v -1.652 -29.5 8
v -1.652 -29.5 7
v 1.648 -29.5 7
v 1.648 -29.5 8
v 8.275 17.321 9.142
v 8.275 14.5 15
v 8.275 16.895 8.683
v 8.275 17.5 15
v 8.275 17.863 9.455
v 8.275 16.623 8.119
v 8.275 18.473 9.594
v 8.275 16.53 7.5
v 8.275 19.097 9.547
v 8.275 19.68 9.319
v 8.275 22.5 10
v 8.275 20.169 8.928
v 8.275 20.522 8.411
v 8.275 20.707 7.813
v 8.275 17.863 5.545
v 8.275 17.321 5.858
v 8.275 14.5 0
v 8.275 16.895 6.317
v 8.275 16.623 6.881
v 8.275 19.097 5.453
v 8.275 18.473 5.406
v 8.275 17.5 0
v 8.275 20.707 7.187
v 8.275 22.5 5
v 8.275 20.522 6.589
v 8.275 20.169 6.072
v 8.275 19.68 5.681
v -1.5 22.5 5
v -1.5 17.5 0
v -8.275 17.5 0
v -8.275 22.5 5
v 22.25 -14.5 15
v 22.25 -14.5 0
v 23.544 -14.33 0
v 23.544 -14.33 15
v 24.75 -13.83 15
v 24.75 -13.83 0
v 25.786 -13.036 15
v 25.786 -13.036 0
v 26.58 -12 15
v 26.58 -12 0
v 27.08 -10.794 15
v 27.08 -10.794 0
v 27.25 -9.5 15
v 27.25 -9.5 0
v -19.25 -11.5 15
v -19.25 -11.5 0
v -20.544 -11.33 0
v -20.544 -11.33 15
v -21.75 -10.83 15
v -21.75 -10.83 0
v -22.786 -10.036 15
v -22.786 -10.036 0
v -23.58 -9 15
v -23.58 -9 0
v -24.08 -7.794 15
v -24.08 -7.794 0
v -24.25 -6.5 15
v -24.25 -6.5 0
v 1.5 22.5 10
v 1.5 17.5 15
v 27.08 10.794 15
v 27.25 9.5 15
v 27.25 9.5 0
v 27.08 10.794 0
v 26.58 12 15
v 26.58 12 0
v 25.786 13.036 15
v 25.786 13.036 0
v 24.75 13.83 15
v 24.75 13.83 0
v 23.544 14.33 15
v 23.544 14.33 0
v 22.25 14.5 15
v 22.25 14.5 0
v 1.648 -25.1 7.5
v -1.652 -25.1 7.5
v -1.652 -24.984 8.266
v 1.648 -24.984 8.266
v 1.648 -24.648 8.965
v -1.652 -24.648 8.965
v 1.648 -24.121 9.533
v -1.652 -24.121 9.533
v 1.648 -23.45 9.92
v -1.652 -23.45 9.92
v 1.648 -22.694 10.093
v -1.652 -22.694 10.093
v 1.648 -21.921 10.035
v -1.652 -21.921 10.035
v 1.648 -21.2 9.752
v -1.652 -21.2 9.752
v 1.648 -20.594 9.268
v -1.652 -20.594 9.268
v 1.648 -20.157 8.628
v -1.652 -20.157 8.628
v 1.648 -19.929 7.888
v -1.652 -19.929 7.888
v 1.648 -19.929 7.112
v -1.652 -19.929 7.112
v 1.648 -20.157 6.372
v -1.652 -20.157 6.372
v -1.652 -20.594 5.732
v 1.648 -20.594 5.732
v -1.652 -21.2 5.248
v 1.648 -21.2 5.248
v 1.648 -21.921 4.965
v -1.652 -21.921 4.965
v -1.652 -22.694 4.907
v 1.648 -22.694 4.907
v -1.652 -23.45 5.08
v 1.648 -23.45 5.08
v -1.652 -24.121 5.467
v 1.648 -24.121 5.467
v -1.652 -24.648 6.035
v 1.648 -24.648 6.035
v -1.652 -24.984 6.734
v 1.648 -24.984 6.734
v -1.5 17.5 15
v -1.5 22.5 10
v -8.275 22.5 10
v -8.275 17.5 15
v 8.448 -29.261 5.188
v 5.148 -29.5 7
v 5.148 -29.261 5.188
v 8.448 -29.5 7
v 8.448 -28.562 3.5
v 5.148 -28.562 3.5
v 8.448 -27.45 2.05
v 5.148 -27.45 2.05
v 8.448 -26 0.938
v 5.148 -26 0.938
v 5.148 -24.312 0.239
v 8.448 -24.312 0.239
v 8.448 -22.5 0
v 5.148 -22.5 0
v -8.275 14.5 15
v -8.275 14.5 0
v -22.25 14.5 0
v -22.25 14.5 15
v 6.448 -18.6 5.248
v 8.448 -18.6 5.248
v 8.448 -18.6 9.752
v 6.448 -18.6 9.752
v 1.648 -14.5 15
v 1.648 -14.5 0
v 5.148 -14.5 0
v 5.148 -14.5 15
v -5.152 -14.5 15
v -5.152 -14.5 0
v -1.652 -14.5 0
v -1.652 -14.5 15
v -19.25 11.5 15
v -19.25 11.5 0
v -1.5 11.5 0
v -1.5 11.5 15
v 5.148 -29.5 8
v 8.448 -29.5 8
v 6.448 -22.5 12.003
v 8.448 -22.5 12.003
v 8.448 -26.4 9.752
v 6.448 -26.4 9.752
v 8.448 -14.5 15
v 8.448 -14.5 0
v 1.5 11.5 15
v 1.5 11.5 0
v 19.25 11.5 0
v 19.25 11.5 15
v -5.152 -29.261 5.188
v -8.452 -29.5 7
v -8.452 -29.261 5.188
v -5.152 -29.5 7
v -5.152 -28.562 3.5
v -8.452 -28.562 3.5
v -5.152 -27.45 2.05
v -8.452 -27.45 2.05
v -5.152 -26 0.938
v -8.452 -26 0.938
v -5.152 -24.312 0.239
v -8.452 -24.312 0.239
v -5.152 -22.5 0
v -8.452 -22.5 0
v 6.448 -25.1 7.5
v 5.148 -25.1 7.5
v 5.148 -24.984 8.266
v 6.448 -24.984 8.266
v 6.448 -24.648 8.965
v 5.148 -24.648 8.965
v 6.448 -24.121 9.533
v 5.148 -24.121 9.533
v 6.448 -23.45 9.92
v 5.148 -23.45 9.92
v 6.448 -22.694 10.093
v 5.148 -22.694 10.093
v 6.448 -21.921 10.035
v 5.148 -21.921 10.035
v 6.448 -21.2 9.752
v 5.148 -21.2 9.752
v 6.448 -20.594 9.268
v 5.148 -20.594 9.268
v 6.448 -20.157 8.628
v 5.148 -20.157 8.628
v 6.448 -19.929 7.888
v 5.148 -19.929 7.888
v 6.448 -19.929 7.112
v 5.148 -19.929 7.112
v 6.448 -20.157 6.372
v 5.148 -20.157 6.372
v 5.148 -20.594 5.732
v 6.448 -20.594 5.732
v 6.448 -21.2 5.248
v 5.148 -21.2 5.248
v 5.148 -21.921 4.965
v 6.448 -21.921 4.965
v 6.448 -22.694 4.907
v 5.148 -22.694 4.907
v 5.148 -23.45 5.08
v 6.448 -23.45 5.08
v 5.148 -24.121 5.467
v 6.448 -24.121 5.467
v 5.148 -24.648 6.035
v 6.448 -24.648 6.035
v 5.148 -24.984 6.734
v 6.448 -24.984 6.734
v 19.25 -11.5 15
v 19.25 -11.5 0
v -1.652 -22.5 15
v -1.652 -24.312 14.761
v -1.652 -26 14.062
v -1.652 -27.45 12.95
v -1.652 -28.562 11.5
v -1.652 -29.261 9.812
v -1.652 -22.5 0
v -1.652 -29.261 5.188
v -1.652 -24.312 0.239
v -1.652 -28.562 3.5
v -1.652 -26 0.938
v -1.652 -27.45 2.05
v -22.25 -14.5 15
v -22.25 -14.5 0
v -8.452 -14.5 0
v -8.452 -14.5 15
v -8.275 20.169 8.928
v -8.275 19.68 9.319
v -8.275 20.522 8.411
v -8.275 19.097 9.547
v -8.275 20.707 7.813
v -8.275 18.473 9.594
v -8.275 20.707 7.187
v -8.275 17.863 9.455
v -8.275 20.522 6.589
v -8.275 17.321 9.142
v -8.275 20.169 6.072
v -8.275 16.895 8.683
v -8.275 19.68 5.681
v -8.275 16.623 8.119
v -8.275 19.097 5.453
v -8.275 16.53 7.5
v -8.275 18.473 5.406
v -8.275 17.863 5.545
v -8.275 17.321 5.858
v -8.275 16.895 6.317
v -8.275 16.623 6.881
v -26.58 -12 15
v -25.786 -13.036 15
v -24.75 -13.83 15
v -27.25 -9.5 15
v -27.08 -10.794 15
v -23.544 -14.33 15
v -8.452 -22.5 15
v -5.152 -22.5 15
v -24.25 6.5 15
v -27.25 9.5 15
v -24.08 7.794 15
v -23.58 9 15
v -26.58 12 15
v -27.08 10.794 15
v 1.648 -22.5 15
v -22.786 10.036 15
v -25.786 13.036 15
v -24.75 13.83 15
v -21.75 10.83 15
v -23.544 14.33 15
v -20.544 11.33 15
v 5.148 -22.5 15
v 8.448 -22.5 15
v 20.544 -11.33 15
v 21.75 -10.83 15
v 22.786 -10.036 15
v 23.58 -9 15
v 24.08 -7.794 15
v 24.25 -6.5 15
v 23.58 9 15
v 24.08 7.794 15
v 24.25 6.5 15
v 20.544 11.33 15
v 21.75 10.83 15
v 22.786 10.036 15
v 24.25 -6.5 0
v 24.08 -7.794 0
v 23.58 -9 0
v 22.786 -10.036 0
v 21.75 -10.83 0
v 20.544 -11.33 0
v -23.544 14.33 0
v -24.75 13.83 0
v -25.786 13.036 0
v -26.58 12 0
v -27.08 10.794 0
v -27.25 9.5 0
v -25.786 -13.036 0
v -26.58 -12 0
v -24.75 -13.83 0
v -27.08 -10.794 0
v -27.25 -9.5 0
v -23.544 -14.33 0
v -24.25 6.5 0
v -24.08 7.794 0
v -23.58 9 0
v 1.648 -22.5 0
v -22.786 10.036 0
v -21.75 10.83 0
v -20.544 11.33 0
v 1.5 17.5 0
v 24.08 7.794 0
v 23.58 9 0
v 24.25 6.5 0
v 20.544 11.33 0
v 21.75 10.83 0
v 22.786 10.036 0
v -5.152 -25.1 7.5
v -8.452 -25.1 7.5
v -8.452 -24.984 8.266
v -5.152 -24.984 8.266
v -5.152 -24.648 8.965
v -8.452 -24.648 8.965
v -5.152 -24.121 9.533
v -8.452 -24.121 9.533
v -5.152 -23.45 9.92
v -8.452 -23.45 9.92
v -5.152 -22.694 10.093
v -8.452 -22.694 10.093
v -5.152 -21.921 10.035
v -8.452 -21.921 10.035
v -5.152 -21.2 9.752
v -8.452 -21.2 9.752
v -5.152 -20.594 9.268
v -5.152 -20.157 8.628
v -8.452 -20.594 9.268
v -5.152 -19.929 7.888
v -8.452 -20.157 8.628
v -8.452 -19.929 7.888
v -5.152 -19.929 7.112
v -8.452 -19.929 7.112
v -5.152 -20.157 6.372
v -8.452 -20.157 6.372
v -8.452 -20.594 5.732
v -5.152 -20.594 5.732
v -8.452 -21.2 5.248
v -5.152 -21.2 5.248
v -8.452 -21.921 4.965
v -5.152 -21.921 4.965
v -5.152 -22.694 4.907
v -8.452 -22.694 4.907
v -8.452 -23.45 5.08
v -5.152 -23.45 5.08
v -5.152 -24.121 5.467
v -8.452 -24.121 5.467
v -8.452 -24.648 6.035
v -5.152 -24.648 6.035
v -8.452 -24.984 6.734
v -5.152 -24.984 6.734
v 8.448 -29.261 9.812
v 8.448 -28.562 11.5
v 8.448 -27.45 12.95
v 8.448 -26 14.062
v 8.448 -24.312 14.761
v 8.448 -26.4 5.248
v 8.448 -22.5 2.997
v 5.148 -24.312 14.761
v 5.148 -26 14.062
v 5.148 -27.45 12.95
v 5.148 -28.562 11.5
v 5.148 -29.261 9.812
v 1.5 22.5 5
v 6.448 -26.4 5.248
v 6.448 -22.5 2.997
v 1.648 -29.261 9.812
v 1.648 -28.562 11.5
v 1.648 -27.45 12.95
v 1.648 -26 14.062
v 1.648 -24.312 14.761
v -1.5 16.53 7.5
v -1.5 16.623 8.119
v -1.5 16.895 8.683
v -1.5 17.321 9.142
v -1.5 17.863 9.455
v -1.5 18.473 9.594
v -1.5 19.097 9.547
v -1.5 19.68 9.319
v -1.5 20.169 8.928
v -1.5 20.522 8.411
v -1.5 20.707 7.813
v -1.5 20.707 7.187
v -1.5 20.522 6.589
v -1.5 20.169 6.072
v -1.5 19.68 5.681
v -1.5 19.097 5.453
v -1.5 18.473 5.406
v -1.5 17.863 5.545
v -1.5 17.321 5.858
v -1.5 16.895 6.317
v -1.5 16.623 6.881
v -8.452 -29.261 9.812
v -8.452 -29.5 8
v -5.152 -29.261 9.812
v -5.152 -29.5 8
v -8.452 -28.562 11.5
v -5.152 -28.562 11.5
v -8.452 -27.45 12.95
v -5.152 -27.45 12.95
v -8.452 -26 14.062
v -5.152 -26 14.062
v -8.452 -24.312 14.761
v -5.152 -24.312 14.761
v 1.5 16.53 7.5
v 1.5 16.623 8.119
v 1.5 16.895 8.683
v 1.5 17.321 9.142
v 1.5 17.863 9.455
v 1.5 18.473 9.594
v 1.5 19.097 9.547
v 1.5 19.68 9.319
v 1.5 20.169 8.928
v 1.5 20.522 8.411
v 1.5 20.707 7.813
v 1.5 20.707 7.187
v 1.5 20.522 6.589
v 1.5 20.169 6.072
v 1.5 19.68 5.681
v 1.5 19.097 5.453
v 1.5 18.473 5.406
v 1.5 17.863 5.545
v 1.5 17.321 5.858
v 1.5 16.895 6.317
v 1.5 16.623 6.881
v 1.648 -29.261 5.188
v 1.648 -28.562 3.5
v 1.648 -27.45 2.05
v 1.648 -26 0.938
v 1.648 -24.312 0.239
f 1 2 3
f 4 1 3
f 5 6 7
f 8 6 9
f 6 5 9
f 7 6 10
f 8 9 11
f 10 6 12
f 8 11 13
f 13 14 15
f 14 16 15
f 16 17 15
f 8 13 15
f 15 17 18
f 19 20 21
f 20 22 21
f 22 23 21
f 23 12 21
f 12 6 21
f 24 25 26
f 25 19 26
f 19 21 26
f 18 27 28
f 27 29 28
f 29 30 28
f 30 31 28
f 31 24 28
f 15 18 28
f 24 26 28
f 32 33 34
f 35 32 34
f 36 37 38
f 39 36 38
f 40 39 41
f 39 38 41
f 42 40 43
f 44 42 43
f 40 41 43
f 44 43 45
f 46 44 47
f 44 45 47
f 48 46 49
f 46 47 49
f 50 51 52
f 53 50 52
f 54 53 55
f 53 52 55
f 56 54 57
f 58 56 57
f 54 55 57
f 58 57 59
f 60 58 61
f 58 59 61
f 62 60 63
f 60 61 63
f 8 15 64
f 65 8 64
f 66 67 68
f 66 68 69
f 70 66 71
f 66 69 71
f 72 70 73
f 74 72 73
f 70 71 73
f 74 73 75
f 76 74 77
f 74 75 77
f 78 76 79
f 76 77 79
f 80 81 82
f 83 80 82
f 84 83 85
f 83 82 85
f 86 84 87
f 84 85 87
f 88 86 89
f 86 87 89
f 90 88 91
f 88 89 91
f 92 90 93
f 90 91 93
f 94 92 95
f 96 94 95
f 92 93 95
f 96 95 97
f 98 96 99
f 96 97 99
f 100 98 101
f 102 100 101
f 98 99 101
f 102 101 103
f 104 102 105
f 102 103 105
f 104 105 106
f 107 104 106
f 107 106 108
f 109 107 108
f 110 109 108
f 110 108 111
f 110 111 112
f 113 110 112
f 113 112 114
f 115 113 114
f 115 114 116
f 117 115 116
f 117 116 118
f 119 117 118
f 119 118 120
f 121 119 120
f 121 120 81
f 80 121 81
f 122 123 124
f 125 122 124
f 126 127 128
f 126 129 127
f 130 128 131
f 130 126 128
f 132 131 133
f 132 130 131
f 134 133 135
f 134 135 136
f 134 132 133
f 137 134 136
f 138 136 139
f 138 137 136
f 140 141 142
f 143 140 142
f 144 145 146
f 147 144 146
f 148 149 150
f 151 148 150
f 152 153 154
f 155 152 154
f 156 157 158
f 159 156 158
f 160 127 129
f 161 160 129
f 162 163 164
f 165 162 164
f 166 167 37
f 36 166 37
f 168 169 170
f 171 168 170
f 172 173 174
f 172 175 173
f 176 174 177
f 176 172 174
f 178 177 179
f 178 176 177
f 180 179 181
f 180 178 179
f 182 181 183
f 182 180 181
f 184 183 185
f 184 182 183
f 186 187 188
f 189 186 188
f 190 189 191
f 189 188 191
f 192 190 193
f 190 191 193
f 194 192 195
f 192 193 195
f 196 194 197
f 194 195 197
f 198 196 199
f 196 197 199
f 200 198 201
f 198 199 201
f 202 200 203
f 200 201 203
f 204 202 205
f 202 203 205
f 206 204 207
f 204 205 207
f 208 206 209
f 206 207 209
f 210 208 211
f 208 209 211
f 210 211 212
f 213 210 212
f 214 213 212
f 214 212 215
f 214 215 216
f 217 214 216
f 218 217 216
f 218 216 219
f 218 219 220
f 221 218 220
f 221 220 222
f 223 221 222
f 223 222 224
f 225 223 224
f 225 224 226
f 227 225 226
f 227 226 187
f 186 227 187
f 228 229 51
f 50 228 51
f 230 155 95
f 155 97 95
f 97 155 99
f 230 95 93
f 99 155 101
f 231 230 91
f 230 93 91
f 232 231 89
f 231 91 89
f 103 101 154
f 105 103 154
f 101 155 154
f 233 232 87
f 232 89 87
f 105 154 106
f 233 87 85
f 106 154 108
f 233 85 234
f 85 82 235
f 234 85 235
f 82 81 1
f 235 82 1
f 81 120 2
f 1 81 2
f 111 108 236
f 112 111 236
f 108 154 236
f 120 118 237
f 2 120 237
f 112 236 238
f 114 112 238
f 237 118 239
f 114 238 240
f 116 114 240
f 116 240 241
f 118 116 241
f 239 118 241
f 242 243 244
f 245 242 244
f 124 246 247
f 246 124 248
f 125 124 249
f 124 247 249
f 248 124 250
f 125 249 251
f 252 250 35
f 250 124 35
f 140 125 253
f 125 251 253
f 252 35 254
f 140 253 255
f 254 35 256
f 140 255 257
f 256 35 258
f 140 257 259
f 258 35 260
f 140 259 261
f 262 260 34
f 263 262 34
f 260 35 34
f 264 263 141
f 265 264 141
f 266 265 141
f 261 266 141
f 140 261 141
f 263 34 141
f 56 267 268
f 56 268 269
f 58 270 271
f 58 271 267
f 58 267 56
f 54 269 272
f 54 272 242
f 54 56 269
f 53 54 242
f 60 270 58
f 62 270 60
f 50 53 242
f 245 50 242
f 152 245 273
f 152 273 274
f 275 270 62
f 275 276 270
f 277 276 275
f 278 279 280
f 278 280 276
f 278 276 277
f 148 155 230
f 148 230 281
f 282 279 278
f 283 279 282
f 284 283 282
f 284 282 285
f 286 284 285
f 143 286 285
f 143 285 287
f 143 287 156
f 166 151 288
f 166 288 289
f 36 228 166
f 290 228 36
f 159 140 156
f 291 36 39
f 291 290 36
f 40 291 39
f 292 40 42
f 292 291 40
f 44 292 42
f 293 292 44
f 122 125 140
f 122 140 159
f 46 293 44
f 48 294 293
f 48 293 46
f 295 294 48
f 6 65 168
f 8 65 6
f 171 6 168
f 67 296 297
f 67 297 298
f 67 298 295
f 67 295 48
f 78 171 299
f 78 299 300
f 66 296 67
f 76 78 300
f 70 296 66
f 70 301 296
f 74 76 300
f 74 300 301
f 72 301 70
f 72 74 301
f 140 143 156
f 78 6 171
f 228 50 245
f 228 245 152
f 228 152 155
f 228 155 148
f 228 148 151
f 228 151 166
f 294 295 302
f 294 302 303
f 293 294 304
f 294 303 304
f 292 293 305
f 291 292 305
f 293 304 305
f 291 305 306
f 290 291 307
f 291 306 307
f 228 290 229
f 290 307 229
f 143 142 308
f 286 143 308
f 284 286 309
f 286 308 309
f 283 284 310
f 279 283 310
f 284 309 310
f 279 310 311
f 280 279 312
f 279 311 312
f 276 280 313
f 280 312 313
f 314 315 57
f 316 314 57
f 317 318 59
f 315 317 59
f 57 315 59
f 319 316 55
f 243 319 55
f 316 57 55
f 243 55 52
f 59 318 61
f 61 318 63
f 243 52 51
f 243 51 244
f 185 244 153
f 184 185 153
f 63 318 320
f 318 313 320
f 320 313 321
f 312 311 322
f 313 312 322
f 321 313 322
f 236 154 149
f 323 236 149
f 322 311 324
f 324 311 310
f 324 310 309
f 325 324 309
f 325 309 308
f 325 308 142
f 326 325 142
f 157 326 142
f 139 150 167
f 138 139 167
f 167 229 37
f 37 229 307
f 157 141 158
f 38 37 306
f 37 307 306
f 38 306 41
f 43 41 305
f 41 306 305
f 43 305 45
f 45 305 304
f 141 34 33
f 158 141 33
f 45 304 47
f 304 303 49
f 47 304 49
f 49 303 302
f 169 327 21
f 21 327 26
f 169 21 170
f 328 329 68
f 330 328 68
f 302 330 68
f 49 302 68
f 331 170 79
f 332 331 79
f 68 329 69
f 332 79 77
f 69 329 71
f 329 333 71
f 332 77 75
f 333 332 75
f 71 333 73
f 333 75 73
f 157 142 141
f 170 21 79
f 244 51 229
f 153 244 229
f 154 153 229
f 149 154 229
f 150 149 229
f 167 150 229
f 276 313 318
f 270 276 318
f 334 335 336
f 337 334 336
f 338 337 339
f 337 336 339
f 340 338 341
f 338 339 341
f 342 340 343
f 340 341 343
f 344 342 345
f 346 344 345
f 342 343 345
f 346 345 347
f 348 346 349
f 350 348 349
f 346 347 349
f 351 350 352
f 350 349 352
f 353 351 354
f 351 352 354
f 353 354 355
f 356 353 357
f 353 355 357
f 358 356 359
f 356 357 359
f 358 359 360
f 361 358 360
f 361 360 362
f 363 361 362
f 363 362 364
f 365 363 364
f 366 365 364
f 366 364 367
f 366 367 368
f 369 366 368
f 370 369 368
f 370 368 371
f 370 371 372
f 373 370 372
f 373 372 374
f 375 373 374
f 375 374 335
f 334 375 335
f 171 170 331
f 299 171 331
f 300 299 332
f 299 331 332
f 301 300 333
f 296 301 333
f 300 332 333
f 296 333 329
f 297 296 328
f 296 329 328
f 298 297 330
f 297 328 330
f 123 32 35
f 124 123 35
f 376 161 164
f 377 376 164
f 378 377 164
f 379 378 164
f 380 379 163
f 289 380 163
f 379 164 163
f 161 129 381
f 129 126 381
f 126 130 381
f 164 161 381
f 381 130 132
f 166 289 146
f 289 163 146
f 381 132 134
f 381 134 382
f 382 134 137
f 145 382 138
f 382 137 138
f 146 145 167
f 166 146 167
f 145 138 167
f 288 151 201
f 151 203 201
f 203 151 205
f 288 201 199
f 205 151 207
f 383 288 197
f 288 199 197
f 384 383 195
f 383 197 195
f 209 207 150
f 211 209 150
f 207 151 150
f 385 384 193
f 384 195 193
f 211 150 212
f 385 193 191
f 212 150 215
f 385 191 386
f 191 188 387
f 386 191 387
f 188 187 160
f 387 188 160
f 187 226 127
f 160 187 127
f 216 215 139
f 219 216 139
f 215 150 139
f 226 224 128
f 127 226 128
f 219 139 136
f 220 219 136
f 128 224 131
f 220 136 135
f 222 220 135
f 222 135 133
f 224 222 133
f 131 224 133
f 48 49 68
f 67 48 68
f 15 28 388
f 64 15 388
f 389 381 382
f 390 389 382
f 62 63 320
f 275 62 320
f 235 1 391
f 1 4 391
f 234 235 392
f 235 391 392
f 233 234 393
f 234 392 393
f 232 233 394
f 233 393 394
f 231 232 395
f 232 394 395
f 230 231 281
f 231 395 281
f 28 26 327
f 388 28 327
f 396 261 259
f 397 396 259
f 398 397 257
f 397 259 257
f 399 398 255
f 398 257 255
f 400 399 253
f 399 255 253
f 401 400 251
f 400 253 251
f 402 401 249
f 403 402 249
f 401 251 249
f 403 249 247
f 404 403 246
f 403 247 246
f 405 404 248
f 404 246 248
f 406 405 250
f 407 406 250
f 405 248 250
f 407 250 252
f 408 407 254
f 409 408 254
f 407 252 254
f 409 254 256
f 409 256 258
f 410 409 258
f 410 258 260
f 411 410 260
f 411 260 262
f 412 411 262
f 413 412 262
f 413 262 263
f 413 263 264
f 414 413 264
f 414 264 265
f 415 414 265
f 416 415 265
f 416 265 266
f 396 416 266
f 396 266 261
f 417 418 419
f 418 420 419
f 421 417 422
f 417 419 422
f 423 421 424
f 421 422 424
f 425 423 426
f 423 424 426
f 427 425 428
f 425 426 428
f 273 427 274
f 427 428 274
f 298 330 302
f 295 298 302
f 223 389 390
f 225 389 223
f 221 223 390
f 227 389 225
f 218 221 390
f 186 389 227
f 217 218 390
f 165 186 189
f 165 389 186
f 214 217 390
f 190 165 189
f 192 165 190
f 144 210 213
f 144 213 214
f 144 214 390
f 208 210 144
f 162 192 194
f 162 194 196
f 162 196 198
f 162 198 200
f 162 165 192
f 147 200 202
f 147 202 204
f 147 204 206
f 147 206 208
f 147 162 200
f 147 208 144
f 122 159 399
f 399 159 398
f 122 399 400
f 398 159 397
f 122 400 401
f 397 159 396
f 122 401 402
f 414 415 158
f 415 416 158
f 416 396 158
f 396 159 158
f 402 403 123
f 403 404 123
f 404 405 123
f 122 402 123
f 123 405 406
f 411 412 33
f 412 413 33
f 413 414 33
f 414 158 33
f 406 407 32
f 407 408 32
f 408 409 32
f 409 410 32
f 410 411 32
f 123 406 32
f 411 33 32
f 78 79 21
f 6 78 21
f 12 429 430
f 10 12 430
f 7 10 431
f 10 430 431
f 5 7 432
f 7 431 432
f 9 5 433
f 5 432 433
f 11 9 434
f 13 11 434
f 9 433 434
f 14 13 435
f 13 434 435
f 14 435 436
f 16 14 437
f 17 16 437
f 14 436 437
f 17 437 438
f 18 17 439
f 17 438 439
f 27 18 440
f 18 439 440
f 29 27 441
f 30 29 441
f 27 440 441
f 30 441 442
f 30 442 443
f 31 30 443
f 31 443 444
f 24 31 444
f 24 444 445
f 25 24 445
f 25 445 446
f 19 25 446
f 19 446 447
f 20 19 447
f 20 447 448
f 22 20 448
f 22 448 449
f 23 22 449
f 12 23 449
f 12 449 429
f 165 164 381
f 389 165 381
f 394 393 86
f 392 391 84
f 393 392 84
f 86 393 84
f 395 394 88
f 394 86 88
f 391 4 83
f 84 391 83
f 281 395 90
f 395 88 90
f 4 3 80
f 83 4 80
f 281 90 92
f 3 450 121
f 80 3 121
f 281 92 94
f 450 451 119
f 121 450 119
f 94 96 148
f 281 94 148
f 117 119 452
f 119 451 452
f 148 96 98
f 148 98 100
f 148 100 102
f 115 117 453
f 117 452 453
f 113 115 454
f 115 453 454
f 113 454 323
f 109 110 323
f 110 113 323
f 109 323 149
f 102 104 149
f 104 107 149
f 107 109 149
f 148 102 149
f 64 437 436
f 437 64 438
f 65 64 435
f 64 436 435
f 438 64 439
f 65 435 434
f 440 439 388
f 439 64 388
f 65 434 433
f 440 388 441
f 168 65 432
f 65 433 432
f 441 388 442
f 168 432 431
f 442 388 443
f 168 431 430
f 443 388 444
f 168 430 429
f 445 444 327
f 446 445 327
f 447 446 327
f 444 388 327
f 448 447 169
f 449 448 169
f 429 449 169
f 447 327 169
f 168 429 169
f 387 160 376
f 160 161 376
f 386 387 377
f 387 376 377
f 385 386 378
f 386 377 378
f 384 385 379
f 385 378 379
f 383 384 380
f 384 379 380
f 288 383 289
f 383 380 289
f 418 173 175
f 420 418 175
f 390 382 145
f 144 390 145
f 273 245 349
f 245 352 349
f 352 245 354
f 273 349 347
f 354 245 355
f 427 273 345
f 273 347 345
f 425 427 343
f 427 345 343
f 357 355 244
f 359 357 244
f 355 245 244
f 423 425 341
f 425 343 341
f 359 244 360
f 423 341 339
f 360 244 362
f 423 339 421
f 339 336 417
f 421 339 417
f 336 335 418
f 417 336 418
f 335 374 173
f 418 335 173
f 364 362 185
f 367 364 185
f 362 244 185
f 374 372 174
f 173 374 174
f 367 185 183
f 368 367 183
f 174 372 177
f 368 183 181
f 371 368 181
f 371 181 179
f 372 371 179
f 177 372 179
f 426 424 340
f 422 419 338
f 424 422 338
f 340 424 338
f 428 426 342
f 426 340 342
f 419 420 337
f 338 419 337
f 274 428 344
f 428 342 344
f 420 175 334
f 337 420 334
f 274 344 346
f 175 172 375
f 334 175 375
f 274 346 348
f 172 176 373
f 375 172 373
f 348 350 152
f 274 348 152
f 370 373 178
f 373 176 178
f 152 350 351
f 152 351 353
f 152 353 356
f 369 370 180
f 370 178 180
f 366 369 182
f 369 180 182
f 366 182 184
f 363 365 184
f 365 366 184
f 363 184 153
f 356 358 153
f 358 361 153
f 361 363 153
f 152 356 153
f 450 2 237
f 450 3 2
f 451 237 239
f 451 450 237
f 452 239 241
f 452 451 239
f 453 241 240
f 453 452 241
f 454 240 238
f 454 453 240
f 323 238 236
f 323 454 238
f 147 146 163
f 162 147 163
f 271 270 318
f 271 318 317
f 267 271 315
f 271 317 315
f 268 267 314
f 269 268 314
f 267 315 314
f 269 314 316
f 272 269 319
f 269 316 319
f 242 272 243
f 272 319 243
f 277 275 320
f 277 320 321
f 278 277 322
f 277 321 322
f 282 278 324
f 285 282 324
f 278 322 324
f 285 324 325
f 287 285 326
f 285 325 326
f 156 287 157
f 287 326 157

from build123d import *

# Parameters (mm, degrees)
F1_DEPTH = 15
F2_R     = 7
F3_R     = 2.6
F3_R_2   = 2.1
F4_DEPTH = 25
F6_DEPTH = 2
F7_SIZE  = 5


with BuildPart() as f1:
    # F0 (on Top) → F1 (new body)
    with BuildSketch(Plane.XY):
        with BuildLine():
            Line((8.448482, -14.5), (22.25, -14.5))
            ThreePointArc((22.25, -14.5), (25.785534, -13.035534), (27.25, -9.5))
            Line((27.25, -9.5), (27.25, 9.5))
            ThreePointArc((27.25, 9.5), (25.785534, 13.035534), (22.25, 14.5))
            Line((22.25, 14.5), (8.275024, 14.5))
            Line((8.275024, 14.5), (8.275024, 22.5))
            Line((8.275024, 22.5), (1.5, 22.5))
            Line((1.5, 22.5), (1.5, 14.5))
            Line((1.5, 14.5), (1.5, 11.5))
            Line((1.5, 11.5), (19.25, 11.5))
            ThreePointArc((19.25, 11.5), (22.785534, 10.035534), (24.25, 6.5))
            Line((24.25, 6.5), (24.25, -6.5))
            ThreePointArc((24.25, -6.5), (22.785534, -10.035534), (19.25, -11.5))
            Line((19.25, -11.5), (-19.25, -11.5))
            ThreePointArc((-19.25, -11.5), (-22.785534, -10.035534), (-24.25, -6.5))
            Line((-24.25, -6.5), (-24.25, 6.5))
            ThreePointArc((-24.25, 6.5), (-22.785534, 10.035534), (-19.25, 11.5))
            Line((-19.25, 11.5), (-1.5, 11.5))
            Line((-1.5, 11.5), (-1.5, 14.5))
            Line((-1.5, 14.5), (-1.5, 22.5))
            Line((-1.5, 22.5), (-8.275024, 22.5))
            Line((-8.275024, 22.5), (-8.275024, 14.5))
            Line((-8.275024, 14.5), (-22.25, 14.5))
            ThreePointArc((-22.25, 14.5), (-25.785534, 13.035534), (-27.25, 9.5))
            Line((-27.25, 9.5), (-27.25, -9.5))
            ThreePointArc((-27.25, -9.5), (-25.785534, -13.035534), (-22.25, -14.5))
            Line((-22.25, -14.5), (-8.451518, -14.5))
            Line((-8.451518, -14.5), (-8.451518, -29.5))
            Line((-8.451518, -29.5), (-5.151518, -29.5))
            Line((-5.151518, -29.5), (-5.151518, -14.5))
            Line((-5.151518, -14.5), (-1.651518, -14.5))
            Line((-1.651518, -14.5), (-1.651518, -29.5))
            Line((-1.651518, -29.5), (1.648482, -29.5))
            Line((1.648482, -29.5), (1.648482, -14.5))
            Line((1.648482, -14.5), (5.148482, -14.5))
            Line((5.148482, -14.5), (5.148482, -29.5))
            Line((5.148482, -29.5), (8.448482, -29.5))
            Line((8.448482, -29.5), (8.448482, -14.5))
        make_face()
    extrude(amount=F1_DEPTH)

    # F2
    f2_edges = [f1.edges().sort_by_distance(p)[0] for p in [
        (-6.801518, -29.5, 15),
        (-6.801518, -29.5, 0),
        (-0.001518, -29.5, 15),
        (6.798482, -29.5, 15),
        (6.798482, -29.5, 0),
        (-0.001518, -29.5, 0),
    ]]
    fillet(f2_edges, radius=F2_R)

    # F3 (on face) → F4 (cut)
    with BuildSketch(Plane(origin=(-8.451518, 0, 0), x_dir=(0, -1, 0), z_dir=(-1, 0, 0))):
        with Locations((22.5, 7.5)):
            Circle(F3_R)
        with Locations((-18.629974, 7.5)):
            Circle(F3_R_2)
    extrude(amount=-F4_DEPTH, mode=Mode.SUBTRACT)

    # F5 (on face) → F6 (cut)
    with BuildSketch(Plane.YZ.offset(8.448482)):
        Polygon((-18.6, 5.248334), (-18.6, 9.751666), (-22.5, 12.003332), (-26.4, 9.751666), (-26.4, 5.248334), (-22.5, 2.996668), align=None)
    extrude(amount=-F6_DEPTH, mode=Mode.SUBTRACT)

    # F7
    f7_edges = [f1.edges().sort_by_distance(p)[0] for p in [
        (4.887512, 22.5, 15),
        (-4.887512, 22.5, 15),
        (4.887512, 22.5, 0),
        (-4.887512, 22.5, 0),
    ]]
    chamfer(f7_edges, length=F7_SIZE)


solid = f1.part
